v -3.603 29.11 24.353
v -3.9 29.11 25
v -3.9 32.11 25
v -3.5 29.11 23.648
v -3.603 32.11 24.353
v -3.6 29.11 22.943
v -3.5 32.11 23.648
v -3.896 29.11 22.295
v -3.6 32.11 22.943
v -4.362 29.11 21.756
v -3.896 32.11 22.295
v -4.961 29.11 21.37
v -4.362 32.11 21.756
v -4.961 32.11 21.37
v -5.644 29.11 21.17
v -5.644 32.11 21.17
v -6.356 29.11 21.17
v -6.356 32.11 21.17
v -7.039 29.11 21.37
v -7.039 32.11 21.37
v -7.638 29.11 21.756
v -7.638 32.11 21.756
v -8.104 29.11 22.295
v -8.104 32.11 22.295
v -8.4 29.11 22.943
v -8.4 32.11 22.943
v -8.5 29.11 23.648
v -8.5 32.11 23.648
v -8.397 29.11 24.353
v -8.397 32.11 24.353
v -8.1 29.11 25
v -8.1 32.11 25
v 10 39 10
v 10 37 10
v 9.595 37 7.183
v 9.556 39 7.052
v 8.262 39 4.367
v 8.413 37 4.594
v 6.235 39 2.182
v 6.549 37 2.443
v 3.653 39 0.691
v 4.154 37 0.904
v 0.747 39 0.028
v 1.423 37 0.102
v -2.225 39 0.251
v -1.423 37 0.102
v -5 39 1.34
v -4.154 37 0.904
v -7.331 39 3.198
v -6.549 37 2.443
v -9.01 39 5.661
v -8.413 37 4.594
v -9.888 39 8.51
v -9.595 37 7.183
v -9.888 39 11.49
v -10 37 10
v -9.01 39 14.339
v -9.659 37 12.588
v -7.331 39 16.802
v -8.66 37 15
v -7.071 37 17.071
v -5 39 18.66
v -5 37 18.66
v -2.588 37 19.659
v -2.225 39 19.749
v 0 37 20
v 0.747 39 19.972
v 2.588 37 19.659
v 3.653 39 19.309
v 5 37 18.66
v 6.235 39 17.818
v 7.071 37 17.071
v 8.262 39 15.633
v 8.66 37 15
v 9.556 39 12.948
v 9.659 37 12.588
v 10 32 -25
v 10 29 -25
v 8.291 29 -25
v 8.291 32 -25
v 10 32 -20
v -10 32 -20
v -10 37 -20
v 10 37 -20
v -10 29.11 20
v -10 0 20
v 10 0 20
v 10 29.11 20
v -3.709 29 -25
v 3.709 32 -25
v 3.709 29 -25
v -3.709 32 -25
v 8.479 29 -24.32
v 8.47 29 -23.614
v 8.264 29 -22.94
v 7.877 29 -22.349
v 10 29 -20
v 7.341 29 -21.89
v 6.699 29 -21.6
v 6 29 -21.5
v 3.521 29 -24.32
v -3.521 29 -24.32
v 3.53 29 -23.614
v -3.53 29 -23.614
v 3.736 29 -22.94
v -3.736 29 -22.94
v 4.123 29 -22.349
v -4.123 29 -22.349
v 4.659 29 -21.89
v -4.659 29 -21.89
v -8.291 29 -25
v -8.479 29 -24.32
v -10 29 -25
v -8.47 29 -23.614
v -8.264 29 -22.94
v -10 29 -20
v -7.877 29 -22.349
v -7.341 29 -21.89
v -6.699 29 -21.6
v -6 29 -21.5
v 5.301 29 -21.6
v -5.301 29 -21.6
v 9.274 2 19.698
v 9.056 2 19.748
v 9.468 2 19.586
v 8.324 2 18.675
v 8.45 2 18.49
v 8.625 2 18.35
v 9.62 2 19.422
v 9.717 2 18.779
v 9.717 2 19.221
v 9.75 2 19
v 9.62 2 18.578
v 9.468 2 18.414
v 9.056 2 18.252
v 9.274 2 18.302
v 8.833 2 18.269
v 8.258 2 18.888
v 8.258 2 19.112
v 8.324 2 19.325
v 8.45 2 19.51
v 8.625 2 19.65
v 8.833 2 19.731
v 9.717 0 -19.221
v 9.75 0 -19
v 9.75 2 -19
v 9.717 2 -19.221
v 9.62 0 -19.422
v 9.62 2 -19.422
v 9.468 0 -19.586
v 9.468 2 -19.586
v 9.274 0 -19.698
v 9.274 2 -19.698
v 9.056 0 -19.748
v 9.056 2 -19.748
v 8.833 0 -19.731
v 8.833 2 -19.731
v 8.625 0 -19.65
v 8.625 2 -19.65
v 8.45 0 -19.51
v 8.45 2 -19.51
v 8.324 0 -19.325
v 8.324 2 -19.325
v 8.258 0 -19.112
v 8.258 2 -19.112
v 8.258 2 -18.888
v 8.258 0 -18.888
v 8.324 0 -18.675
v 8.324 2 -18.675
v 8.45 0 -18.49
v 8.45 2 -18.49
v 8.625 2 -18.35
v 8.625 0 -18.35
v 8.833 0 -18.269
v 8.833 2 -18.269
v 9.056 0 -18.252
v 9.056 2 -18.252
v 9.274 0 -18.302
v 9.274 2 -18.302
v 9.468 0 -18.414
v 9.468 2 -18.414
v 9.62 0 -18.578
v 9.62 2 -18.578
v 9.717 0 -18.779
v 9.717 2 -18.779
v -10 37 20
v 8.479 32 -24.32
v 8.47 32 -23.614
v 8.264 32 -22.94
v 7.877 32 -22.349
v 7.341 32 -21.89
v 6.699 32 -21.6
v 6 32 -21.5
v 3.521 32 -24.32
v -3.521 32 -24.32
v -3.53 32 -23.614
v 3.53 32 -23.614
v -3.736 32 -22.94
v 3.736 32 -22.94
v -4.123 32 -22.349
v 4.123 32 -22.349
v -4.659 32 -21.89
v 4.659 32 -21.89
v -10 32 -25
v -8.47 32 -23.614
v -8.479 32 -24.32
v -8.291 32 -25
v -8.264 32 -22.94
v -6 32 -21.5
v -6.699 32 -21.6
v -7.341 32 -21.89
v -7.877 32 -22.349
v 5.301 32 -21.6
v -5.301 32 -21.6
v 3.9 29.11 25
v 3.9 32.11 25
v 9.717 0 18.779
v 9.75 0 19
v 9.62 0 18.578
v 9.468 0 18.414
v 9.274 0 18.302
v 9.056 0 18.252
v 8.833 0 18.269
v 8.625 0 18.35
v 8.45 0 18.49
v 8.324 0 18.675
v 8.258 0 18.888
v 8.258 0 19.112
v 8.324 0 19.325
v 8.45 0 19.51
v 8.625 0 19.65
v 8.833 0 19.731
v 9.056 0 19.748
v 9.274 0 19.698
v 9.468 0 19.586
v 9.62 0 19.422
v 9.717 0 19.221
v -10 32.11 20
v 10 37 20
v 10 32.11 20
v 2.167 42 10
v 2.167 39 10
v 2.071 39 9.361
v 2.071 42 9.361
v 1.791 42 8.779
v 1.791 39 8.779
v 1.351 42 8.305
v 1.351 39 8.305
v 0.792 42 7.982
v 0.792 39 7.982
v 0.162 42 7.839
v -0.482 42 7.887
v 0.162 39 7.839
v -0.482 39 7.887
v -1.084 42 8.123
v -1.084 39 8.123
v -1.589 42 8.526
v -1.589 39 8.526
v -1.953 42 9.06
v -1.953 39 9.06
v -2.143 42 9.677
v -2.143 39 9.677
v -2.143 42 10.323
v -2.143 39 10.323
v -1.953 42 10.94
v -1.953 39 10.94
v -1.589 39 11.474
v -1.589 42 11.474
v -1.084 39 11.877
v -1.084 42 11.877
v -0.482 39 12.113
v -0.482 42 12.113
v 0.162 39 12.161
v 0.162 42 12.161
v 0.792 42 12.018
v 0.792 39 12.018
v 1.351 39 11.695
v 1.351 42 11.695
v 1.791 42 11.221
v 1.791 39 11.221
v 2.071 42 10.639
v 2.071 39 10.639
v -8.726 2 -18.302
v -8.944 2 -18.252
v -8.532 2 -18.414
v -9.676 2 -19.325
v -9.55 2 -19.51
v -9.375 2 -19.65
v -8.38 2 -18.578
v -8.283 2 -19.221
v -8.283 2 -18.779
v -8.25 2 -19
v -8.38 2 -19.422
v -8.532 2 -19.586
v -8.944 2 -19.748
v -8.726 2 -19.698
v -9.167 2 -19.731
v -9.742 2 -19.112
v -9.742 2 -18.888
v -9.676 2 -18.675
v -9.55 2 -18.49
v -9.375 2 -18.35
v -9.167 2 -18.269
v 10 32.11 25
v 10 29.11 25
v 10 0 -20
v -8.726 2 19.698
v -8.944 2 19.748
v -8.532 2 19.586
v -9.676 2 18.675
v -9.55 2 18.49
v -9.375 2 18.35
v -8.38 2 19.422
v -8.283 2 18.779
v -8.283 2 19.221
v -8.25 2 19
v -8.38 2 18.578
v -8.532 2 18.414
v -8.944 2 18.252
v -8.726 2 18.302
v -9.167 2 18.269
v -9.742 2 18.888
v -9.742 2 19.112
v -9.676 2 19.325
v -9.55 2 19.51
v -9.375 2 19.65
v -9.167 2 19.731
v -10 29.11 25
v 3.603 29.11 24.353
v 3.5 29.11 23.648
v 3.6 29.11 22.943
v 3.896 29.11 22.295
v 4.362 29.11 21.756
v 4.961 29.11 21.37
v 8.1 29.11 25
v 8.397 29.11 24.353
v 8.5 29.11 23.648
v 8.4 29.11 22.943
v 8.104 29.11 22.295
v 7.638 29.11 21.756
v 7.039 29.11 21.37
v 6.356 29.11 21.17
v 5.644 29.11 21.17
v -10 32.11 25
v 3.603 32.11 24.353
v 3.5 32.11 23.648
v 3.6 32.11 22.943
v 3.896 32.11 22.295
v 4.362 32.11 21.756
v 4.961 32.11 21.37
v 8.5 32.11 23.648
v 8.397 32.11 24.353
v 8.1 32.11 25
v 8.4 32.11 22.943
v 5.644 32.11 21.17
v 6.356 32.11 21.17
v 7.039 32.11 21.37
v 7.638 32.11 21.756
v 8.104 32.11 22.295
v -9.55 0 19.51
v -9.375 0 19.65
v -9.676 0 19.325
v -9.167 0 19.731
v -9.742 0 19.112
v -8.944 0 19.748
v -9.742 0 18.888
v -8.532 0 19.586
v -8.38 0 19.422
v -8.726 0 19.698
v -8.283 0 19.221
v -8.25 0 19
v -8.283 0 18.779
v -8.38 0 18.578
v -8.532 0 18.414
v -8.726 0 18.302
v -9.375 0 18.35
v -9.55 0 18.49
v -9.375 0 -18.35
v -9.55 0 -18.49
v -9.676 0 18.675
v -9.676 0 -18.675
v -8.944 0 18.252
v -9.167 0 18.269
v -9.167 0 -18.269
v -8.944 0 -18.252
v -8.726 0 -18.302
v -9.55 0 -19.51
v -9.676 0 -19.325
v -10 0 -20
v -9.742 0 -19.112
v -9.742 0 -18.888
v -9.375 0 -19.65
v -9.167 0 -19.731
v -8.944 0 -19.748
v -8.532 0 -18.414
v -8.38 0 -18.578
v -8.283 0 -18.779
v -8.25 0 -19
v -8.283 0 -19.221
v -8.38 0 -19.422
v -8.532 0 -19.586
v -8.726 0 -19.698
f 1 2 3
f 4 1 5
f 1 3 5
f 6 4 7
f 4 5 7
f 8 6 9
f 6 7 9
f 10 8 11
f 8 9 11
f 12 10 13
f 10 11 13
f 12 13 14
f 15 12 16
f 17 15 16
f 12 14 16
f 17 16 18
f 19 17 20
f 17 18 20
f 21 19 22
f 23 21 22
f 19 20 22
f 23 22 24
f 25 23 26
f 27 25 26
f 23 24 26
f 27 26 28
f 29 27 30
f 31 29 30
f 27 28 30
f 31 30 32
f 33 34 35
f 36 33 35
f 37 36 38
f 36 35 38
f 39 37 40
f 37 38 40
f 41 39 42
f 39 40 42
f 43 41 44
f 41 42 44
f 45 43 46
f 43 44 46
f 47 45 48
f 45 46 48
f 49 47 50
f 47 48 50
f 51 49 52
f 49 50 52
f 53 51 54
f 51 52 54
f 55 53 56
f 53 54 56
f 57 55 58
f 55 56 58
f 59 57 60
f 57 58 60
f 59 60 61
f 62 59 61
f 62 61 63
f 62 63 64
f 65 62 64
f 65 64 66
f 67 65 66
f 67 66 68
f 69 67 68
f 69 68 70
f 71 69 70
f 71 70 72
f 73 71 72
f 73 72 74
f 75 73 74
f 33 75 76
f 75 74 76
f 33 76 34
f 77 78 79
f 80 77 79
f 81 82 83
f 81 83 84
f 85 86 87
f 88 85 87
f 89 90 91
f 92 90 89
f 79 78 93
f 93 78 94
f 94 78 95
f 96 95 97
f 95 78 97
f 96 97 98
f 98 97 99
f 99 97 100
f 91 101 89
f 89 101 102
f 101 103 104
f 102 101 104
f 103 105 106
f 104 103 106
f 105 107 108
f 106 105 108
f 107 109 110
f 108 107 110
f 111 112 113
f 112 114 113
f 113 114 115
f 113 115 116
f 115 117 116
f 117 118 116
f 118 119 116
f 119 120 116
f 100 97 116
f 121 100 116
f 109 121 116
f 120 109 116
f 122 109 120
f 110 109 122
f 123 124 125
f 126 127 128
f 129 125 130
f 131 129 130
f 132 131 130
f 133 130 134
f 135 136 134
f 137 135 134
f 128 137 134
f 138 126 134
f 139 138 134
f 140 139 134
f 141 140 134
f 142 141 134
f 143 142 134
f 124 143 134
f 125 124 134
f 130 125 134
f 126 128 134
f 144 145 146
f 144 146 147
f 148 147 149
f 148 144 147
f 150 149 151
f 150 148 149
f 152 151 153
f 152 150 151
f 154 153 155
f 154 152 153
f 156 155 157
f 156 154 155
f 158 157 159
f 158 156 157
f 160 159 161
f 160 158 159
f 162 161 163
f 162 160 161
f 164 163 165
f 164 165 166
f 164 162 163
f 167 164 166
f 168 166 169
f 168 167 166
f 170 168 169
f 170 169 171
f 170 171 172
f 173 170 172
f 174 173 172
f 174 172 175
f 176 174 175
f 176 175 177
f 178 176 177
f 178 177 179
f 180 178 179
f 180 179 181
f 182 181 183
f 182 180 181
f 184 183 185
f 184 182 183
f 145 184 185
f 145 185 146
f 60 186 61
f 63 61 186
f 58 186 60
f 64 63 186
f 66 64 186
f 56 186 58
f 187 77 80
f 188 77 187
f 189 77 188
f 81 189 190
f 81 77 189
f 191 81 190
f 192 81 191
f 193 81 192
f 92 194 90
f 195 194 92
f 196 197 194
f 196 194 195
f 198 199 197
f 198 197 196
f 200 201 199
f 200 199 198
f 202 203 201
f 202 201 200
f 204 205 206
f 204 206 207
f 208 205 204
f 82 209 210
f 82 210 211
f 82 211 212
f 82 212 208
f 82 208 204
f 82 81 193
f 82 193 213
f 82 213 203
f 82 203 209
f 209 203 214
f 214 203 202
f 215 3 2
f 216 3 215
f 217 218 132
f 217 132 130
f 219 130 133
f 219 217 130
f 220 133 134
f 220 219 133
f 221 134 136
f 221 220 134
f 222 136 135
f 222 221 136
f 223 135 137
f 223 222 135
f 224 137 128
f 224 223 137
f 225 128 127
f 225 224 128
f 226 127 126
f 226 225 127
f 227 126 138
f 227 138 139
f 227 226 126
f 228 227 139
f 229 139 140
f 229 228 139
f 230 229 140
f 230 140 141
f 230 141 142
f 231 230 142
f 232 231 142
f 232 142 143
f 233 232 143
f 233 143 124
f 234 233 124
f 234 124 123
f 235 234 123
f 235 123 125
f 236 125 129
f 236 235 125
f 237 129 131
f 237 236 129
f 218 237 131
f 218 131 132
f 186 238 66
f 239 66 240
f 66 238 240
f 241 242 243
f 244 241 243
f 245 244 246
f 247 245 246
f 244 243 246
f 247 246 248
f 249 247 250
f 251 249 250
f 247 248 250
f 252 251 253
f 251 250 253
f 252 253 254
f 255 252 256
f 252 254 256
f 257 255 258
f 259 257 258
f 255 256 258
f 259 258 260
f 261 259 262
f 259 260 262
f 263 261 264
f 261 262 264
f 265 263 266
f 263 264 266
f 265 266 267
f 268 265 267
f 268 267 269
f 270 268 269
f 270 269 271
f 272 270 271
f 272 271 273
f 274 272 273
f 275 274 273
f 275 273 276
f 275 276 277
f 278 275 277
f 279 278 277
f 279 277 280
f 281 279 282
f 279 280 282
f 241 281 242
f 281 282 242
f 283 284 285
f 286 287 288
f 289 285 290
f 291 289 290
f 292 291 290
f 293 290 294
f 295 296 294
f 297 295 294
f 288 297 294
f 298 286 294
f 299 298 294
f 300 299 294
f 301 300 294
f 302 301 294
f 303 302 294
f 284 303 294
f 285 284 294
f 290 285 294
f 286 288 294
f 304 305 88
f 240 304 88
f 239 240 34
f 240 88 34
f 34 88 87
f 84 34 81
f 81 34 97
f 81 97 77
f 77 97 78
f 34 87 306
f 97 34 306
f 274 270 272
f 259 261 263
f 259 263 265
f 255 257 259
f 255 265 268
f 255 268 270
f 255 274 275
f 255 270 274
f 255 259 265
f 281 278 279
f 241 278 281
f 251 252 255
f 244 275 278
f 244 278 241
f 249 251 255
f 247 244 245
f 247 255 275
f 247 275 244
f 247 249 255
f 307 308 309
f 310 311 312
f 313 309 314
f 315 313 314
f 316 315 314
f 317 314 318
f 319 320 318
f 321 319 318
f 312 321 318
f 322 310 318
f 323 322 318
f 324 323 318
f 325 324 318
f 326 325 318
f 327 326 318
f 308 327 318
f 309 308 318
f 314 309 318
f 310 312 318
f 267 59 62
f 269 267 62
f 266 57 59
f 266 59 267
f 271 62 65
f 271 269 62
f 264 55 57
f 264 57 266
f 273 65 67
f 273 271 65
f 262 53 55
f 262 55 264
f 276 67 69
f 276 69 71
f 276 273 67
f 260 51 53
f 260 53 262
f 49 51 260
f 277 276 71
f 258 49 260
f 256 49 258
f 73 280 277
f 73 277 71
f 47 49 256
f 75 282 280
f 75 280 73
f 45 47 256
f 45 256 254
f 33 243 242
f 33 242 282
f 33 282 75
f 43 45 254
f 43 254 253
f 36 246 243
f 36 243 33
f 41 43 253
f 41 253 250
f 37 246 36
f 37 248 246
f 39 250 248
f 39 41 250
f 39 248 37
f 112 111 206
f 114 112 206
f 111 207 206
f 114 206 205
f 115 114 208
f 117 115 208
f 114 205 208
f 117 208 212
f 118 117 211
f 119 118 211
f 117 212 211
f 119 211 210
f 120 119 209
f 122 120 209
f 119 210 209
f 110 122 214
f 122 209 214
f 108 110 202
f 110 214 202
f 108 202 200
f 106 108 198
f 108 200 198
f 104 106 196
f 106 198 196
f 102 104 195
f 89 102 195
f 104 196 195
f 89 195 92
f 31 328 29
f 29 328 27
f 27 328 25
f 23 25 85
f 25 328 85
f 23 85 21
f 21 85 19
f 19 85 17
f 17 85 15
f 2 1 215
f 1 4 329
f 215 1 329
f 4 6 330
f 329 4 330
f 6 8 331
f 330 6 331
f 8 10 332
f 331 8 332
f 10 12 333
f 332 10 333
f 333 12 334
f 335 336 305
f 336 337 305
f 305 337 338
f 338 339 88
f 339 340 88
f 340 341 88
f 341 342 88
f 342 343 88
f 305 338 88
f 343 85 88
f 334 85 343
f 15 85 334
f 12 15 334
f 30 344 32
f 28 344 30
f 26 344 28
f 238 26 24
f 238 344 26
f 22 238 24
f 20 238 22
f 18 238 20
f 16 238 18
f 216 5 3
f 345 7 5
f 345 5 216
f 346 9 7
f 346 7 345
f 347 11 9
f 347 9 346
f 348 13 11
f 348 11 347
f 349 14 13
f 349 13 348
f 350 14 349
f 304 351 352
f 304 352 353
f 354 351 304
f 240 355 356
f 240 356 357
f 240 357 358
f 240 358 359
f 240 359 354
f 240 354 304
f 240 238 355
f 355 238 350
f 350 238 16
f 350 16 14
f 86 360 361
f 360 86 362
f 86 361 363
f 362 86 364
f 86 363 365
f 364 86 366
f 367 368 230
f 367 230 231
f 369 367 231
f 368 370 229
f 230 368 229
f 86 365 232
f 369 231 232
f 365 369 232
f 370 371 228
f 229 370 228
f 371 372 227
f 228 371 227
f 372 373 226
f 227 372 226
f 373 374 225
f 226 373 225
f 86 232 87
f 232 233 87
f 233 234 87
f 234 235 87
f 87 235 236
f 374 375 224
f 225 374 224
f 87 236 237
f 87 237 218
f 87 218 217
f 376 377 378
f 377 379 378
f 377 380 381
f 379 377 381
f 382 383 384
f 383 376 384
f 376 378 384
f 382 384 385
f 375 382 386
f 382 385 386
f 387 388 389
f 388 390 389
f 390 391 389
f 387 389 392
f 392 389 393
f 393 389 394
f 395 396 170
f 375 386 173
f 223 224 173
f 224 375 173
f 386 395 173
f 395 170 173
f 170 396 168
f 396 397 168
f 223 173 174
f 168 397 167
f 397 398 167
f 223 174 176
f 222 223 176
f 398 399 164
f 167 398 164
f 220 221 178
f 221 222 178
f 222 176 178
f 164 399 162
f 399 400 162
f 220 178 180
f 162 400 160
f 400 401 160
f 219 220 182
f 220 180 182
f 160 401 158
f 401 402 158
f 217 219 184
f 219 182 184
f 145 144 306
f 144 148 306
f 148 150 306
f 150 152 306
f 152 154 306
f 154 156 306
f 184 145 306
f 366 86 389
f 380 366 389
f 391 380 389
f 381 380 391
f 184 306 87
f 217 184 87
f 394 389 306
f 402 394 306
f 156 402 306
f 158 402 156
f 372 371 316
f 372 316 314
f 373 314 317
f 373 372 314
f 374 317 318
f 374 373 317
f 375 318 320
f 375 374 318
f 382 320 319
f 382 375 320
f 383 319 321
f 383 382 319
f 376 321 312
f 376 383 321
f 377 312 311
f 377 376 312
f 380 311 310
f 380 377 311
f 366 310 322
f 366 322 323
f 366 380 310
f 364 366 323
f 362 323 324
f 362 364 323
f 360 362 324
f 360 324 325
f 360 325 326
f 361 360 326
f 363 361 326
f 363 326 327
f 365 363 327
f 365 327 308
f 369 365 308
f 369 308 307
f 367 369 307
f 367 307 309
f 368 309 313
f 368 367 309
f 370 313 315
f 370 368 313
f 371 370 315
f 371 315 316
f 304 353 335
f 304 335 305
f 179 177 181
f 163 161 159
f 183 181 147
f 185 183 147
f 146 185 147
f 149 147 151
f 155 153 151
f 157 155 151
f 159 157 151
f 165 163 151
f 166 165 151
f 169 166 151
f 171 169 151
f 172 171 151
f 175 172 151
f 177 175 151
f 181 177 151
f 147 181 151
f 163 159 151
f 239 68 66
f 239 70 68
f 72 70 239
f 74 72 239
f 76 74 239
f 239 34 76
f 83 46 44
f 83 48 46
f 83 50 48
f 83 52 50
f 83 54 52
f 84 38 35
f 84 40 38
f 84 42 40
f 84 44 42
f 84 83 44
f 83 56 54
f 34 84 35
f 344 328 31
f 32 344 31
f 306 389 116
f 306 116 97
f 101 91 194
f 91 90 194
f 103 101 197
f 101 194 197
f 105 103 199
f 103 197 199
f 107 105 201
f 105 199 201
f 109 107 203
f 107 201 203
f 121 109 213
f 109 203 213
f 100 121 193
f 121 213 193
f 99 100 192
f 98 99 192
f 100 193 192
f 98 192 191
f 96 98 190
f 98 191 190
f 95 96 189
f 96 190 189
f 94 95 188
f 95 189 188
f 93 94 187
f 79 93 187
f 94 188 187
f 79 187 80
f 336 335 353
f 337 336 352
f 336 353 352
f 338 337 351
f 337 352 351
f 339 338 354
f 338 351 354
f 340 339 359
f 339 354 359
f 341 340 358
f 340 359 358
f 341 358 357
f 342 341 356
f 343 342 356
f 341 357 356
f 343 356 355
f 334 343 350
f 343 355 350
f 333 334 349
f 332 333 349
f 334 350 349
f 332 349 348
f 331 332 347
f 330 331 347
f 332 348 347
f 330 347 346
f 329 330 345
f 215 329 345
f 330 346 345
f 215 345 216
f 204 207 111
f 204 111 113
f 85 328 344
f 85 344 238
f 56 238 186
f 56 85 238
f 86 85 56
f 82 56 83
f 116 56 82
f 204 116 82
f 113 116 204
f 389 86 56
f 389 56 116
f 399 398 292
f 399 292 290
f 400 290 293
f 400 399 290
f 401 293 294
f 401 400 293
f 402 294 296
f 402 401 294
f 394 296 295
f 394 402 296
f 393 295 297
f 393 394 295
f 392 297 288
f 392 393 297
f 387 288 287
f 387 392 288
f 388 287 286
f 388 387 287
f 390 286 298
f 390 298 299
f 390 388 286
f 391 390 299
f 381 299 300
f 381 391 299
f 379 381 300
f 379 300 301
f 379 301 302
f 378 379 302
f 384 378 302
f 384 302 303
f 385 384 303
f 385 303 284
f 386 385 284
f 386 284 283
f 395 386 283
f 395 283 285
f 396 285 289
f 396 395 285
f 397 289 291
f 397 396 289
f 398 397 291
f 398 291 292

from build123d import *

# Parameters (mm, degrees)
SKETCH_1_W           = 20
SKETCH_1_H           = 40
EXTRUDE_1_DEPTH      = 37
SKETCH_2_R           = 0.75
CUT_EXTRUDE_10_DEPTH = 2
SKETCH_3_R           = 10
EXTRUDE_3_DEPTH      = 2
SKETCH_4_R           = 2.167388434
EXTRUDE_4_DEPTH      = 3
SKETCH_5_W           = 20
SKETCH_5_H           = 3
EXTRUDE_5_DEPTH      = 5
SKETCH_6_R           = 2.5
CUT_EXTRUDE_13_DEPTH = 3
SKETCH_9_W           = 20
SKETCH_9_H           = 3
EXTRUDE_7_DEPTH      = 5
SKETCH_10_R          = 2.5
CUT_EXTRUDE_14_DEPTH = 3


with BuildPart() as part:
    # 草图1 → 凸台-拉伸1 (new body)
    with BuildSketch(Plane(origin=(0, 0, 0), x_dir=(1, 0, 0), z_dir=(0, 1, 0))):
        Rectangle(SKETCH_1_W, SKETCH_1_H)
    extrude(amount=EXTRUDE_1_DEPTH)

    # 草图2 → 切除-拉伸10 (cut)
    with BuildSketch(Plane(origin=(0, 0, 0), x_dir=(1, 0, 0), z_dir=(0, 1, 0))):
        with Locations((-9, 19)):
            Circle(SKETCH_2_R)
        with Locations((9, 19)):
            Circle(SKETCH_2_R)
        with Locations((-9, -19)):
            Circle(SKETCH_2_R)
        with Locations((9, -19)):
            Circle(SKETCH_2_R)
    extrude(amount=CUT_EXTRUDE_10_DEPTH, mode=Mode.SUBTRACT)

    # 草图3 → 凸台-拉伸3 (add)
    with BuildSketch(Plane(origin=(0, 37, 0), x_dir=(1, 0, 0), z_dir=(0, 1, 0))):
        with Locations((0, -10)):
            Circle(SKETCH_3_R)
    extrude(amount=EXTRUDE_3_DEPTH)

    # 草图4 → 凸台-拉伸4 (add)
    with BuildSketch(Plane(origin=(0, 39, 0), x_dir=(1, 0, 0), z_dir=(0, 1, 0))):
        with Locations((0, -10)):
            Circle(SKETCH_4_R)
    extrude(amount=EXTRUDE_4_DEPTH)

    # 草图5 → 凸台-拉伸5 (add)
    with BuildSketch(Plane.XY.offset(20)):
        with Locations((0, 30.61035469)):
            Rectangle(SKETCH_5_W, SKETCH_5_H)
    extrude(amount=EXTRUDE_5_DEPTH)

    # 草图6 → 切除-拉伸13 (cut)
    with BuildSketch(Plane(origin=(0, 32.11035469, 0), x_dir=(1, 0, 0), z_dir=(0, 1, 0))):
        with Locations((-6, -23.644142826)):
            Circle(SKETCH_6_R)
        with Locations((6, -23.644142826)):
            Circle(SKETCH_6_R)
    extrude(amount=-CUT_EXTRUDE_13_DEPTH, mode=Mode.SUBTRACT)

    # 草图9 → 凸台-拉伸7 (add)
    with BuildSketch(Plane(origin=(0, 0, -20), x_dir=(-1, 0, 0), z_dir=(0, 0, -1))):
        with Locations((0, 30.5)):
            Rectangle(SKETCH_9_W, SKETCH_9_H)
    extrude(amount=EXTRUDE_7_DEPTH)

    # 草图10 → 切除-拉伸14 (cut)
    with BuildSketch(Plane(origin=(0, 32, 0), x_dir=(1, 0, 0), z_dir=(0, 1, 0))):
        with Locations((-6, 24)):
            Circle(SKETCH_10_R)
        with Locations((6, 24)):
            Circle(SKETCH_10_R)
    extrude(amount=-CUT_EXTRUDE_14_DEPTH, mode=Mode.SUBTRACT)


solid = part.part
